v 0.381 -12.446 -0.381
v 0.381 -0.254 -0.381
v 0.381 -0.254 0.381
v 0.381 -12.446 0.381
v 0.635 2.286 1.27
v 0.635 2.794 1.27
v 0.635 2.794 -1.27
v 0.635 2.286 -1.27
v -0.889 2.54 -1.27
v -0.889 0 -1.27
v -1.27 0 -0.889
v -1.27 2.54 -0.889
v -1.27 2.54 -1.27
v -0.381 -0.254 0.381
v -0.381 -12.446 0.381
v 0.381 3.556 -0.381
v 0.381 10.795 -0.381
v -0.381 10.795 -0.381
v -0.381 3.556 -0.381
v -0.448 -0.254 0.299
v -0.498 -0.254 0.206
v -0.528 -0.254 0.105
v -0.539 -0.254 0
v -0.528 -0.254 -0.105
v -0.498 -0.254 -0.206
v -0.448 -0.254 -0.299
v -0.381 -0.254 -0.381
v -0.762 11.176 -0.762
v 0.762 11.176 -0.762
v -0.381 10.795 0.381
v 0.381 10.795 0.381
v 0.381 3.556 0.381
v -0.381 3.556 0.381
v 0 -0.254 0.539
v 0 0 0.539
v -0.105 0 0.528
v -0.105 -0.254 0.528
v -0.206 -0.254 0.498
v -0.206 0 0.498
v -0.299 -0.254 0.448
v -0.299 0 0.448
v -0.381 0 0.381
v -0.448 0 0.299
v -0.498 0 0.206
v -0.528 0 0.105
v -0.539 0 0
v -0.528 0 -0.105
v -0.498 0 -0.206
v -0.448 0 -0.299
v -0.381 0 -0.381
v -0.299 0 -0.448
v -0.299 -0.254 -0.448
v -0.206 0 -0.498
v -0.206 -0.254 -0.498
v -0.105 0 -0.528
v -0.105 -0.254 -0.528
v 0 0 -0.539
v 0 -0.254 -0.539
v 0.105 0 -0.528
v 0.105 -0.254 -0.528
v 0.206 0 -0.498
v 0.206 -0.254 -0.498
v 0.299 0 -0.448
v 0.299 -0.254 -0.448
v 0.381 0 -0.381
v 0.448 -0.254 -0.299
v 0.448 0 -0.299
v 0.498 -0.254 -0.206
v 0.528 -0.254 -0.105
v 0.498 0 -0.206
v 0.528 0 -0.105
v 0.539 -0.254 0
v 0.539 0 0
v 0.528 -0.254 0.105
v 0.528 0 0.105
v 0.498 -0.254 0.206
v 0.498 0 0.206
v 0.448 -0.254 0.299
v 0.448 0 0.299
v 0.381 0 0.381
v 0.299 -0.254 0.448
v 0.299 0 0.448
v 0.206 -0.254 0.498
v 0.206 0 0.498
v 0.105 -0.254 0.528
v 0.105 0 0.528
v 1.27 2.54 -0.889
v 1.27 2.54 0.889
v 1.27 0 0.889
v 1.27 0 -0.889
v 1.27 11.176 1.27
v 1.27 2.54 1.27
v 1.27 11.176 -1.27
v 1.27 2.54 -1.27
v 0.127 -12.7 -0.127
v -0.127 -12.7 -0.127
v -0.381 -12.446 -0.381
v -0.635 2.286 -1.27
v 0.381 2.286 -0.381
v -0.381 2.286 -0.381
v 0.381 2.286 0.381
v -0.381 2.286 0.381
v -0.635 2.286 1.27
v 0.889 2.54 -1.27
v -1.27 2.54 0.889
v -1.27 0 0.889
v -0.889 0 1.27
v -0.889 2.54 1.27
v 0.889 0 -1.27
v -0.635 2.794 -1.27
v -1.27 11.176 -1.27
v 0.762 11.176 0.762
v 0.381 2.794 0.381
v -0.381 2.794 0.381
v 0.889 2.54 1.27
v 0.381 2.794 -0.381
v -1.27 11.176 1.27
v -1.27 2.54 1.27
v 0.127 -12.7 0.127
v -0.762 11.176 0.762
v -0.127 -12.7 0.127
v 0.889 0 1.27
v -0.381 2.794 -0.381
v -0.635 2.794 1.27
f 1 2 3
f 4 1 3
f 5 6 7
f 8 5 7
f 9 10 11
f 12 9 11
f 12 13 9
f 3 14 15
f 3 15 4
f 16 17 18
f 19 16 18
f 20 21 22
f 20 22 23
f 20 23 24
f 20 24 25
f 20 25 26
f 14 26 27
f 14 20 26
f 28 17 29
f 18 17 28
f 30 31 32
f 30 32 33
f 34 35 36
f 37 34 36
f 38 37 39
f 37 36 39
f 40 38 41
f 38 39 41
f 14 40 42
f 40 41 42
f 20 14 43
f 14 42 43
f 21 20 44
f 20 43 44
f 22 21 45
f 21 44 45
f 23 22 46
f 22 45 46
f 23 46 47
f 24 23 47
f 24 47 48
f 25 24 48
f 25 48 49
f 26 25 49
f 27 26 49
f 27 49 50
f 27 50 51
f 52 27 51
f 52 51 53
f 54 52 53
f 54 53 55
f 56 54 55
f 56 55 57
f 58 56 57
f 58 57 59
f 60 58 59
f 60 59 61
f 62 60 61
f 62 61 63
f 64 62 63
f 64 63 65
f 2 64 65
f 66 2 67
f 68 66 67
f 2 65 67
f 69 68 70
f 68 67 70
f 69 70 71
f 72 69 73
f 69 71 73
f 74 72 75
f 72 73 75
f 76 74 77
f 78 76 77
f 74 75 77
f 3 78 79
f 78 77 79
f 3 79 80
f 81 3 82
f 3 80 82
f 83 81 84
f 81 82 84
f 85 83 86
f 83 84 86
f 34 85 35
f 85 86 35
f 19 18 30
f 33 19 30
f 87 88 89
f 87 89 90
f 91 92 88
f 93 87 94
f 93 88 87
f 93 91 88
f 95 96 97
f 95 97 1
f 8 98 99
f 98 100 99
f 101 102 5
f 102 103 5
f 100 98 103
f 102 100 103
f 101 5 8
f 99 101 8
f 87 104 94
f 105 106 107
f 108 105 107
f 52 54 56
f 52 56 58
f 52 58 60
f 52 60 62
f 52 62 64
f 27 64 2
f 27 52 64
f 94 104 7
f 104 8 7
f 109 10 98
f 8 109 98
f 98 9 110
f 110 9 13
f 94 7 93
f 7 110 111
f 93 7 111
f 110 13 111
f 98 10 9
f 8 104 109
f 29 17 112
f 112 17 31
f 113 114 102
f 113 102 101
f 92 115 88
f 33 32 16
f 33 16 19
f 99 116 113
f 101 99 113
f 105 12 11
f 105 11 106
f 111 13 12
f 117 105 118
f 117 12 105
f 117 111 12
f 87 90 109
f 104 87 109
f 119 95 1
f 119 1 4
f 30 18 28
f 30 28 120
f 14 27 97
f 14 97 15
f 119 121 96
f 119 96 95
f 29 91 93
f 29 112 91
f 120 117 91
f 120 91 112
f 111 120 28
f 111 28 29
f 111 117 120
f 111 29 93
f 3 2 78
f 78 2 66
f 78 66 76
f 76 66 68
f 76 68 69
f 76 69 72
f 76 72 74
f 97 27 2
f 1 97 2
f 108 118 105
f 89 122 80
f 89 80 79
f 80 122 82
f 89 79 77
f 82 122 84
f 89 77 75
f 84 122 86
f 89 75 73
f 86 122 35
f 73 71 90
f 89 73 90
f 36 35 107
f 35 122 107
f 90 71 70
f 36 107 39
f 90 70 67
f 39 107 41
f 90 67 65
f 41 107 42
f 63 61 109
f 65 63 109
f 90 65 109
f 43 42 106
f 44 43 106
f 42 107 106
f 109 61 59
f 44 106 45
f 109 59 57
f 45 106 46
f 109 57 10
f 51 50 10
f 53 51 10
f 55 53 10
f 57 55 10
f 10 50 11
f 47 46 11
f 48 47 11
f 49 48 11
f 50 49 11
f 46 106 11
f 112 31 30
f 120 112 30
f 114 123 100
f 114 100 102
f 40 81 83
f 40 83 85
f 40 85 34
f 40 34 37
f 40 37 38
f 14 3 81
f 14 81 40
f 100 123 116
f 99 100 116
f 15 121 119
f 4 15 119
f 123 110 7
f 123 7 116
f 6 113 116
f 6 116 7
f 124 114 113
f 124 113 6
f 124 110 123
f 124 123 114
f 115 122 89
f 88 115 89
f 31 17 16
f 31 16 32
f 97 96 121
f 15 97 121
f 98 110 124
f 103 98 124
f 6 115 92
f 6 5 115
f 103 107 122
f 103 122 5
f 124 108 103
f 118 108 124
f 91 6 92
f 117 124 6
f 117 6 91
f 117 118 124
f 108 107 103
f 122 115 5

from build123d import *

# Parameters (mm, degrees)
ESQUISSE1_W             = 8.382
ESQUISSE1_H             = 2.54
BOSS_EXTRU_1_DEPTH      = 1.905
ESQUISSE2_W             = 0.635
ESQUISSE2_H             = 2.54
BOSS_EXTRU_2_DEPTH      = 0.508
ESQUISSE3_W             = 0.762
ESQUISSE3_H             = 0.762
BOSS_EXTRU_3_DEPTH      = 0.508
ESQUISSE4_W             = 1.905
ESQUISSE4_H             = 2.54
BOSS_EXTRU_4_DEPTH      = 2.286
ESQUISSE5_W             = 2.54
ESQUISSE5_H             = 11.176
BOSS_EXTRU_5_DEPTH      = 0.635
ESQUISSE6_R             = 0.538815367
BOSS_EXTRU_6_DEPTH      = 0.254
ESQUISSE7_W             = 0.762
ESQUISSE7_H             = 0.762
BOSS_EXTRU_7_DEPTH      = 12.446
ENL_V_MAT_EXTRU_1_DEPTH = 2.54
ENL_V_MAT_EXTRU_2_DEPTH = 2.54
ENL_V_MAT_EXTRU_3_DEPTH = 2.54
ENL_V_MAT_EXTRU_4_DEPTH = 2.54
ESQUISSE12_W            = 0.762
ESQUISSE12_H            = 0.762
ENL_V_MAT_EXTRU_5_DEPTH = 7.62
CHANFREIN1_SIZE         = 0.254
CHANFREIN2_SIZE         = 0.381


with BuildPart() as part:
    # Esquisse1 → Boss.-Extru.1 (new body)
    with BuildSketch(Plane(origin=(-1.27, 0, 0), x_dir=(0, -1, 0), z_dir=(-1, 0, 0))):
        with Locations((-6.985, 0)):
            Rectangle(ESQUISSE1_W, ESQUISSE1_H)
    extrude(amount=-BOSS_EXTRU_1_DEPTH)

    # Esquisse2 → Boss.-Extru.2 (add)
    with BuildSketch(Plane.XZ.offset(-2.794)):
        with Locations((-0.9525, 0)):
            Rectangle(ESQUISSE2_W, ESQUISSE2_H)
    extrude(amount=BOSS_EXTRU_2_DEPTH)

    # Esquisse3 → Boss.-Extru.3 (add)
    with BuildSketch(Plane.XZ.offset(-2.794)):
        Rectangle(ESQUISSE3_W, ESQUISSE3_H)
    extrude(amount=BOSS_EXTRU_3_DEPTH)

    # Esquisse4 → Boss.-Extru.4 (add)
    with BuildSketch(Plane.XZ.offset(-2.286)):
        with Locations((-0.3175, 0)):
            Rectangle(ESQUISSE4_W, ESQUISSE4_H)
    extrude(amount=BOSS_EXTRU_4_DEPTH)

    # Esquisse5 → Boss.-Extru.5 (add)
    with BuildSketch(Plane(origin=(0.635, 0, 0), x_dir=(0, 0, -1), z_dir=(1, 0, 0))):
        with Locations((0, 5.588)):
            Rectangle(ESQUISSE5_W, ESQUISSE5_H)
    extrude(amount=BOSS_EXTRU_5_DEPTH)

    # Esquisse6 → Boss.-Extru.6 (add)
    with BuildSketch(Plane.XZ):
        with Locations(Location((0, 0, 0), (0, 0, 90))):
            Circle(ESQUISSE6_R)
    extrude(amount=BOSS_EXTRU_6_DEPTH)

    # Esquisse7 → Boss.-Extru.7 (add)
    with BuildSketch(Plane.XZ.offset(0.254)):
        Rectangle(ESQUISSE7_W, ESQUISSE7_H)
    extrude(amount=BOSS_EXTRU_7_DEPTH)

    # Esquisse8 → Enlèv. mat.-Extru.1 (cut)
    with BuildSketch(Plane.XZ):
        Polygon((-1.27, 1.27), (-1.27, 0.889), (-0.889, 1.27), align=None)
    extrude(amount=-ENL_V_MAT_EXTRU_1_DEPTH, mode=Mode.SUBTRACT)

    # Esquisse9 → Enlèv. mat.-Extru.2 (cut)
    with BuildSketch(Plane.XZ):
        Polygon((-1.27, -1.27), (-0.889, -1.27), (-1.27, -0.889), align=None)
    extrude(amount=-ENL_V_MAT_EXTRU_2_DEPTH, mode=Mode.SUBTRACT)

    # Esquisse10 → Enlèv. mat.-Extru.3 (cut)
    with BuildSketch(Plane.XZ):
        Polygon((1.27, 1.27), (0.889, 1.27), (1.27, 0.889), align=None)
    extrude(amount=-ENL_V_MAT_EXTRU_3_DEPTH, mode=Mode.SUBTRACT)

    # Esquisse11 → Enlèv. mat.-Extru.4 (cut)
    with BuildSketch(Plane.XZ):
        Polygon((1.27, -1.27), (1.27, -0.889), (0.889, -1.27), align=None)
    extrude(amount=-ENL_V_MAT_EXTRU_4_DEPTH, mode=Mode.SUBTRACT)

    # Esquisse12 → Enlèv. mat.-Extru.5 (cut)
    with BuildSketch(Plane(origin=(0, 11.176, 0), x_dir=(-1, 0, 0), z_dir=(0, 1, 0))):
        Rectangle(ESQUISSE12_W, ESQUISSE12_H)
    extrude(amount=-ENL_V_MAT_EXTRU_5_DEPTH, mode=Mode.SUBTRACT)

    # Chanfrein1
    chanfrein1_edges = [part.edges().sort_by_distance(p)[0] for p in [
        (0.381, -12.7, 0),
        (0, -12.7, 0.381),
        (-0.381, -12.7, 0),
        (0, -12.7, -0.381),
    ]]
    chamfer(chanfrein1_edges, length=CHANFREIN1_SIZE)

    # Chanfrein2
    chanfrein2_edges = [part.edges().sort_by_distance(p)[0] for p in [
        (0, 11.176, 0.381),
        (0.381, 11.176, 0),
        (0, 11.176, -0.381),
        (-0.381, 11.176, 0),
    ]]
    chamfer(chanfrein2_edges, length=CHANFREIN2_SIZE)


solid = part.part
